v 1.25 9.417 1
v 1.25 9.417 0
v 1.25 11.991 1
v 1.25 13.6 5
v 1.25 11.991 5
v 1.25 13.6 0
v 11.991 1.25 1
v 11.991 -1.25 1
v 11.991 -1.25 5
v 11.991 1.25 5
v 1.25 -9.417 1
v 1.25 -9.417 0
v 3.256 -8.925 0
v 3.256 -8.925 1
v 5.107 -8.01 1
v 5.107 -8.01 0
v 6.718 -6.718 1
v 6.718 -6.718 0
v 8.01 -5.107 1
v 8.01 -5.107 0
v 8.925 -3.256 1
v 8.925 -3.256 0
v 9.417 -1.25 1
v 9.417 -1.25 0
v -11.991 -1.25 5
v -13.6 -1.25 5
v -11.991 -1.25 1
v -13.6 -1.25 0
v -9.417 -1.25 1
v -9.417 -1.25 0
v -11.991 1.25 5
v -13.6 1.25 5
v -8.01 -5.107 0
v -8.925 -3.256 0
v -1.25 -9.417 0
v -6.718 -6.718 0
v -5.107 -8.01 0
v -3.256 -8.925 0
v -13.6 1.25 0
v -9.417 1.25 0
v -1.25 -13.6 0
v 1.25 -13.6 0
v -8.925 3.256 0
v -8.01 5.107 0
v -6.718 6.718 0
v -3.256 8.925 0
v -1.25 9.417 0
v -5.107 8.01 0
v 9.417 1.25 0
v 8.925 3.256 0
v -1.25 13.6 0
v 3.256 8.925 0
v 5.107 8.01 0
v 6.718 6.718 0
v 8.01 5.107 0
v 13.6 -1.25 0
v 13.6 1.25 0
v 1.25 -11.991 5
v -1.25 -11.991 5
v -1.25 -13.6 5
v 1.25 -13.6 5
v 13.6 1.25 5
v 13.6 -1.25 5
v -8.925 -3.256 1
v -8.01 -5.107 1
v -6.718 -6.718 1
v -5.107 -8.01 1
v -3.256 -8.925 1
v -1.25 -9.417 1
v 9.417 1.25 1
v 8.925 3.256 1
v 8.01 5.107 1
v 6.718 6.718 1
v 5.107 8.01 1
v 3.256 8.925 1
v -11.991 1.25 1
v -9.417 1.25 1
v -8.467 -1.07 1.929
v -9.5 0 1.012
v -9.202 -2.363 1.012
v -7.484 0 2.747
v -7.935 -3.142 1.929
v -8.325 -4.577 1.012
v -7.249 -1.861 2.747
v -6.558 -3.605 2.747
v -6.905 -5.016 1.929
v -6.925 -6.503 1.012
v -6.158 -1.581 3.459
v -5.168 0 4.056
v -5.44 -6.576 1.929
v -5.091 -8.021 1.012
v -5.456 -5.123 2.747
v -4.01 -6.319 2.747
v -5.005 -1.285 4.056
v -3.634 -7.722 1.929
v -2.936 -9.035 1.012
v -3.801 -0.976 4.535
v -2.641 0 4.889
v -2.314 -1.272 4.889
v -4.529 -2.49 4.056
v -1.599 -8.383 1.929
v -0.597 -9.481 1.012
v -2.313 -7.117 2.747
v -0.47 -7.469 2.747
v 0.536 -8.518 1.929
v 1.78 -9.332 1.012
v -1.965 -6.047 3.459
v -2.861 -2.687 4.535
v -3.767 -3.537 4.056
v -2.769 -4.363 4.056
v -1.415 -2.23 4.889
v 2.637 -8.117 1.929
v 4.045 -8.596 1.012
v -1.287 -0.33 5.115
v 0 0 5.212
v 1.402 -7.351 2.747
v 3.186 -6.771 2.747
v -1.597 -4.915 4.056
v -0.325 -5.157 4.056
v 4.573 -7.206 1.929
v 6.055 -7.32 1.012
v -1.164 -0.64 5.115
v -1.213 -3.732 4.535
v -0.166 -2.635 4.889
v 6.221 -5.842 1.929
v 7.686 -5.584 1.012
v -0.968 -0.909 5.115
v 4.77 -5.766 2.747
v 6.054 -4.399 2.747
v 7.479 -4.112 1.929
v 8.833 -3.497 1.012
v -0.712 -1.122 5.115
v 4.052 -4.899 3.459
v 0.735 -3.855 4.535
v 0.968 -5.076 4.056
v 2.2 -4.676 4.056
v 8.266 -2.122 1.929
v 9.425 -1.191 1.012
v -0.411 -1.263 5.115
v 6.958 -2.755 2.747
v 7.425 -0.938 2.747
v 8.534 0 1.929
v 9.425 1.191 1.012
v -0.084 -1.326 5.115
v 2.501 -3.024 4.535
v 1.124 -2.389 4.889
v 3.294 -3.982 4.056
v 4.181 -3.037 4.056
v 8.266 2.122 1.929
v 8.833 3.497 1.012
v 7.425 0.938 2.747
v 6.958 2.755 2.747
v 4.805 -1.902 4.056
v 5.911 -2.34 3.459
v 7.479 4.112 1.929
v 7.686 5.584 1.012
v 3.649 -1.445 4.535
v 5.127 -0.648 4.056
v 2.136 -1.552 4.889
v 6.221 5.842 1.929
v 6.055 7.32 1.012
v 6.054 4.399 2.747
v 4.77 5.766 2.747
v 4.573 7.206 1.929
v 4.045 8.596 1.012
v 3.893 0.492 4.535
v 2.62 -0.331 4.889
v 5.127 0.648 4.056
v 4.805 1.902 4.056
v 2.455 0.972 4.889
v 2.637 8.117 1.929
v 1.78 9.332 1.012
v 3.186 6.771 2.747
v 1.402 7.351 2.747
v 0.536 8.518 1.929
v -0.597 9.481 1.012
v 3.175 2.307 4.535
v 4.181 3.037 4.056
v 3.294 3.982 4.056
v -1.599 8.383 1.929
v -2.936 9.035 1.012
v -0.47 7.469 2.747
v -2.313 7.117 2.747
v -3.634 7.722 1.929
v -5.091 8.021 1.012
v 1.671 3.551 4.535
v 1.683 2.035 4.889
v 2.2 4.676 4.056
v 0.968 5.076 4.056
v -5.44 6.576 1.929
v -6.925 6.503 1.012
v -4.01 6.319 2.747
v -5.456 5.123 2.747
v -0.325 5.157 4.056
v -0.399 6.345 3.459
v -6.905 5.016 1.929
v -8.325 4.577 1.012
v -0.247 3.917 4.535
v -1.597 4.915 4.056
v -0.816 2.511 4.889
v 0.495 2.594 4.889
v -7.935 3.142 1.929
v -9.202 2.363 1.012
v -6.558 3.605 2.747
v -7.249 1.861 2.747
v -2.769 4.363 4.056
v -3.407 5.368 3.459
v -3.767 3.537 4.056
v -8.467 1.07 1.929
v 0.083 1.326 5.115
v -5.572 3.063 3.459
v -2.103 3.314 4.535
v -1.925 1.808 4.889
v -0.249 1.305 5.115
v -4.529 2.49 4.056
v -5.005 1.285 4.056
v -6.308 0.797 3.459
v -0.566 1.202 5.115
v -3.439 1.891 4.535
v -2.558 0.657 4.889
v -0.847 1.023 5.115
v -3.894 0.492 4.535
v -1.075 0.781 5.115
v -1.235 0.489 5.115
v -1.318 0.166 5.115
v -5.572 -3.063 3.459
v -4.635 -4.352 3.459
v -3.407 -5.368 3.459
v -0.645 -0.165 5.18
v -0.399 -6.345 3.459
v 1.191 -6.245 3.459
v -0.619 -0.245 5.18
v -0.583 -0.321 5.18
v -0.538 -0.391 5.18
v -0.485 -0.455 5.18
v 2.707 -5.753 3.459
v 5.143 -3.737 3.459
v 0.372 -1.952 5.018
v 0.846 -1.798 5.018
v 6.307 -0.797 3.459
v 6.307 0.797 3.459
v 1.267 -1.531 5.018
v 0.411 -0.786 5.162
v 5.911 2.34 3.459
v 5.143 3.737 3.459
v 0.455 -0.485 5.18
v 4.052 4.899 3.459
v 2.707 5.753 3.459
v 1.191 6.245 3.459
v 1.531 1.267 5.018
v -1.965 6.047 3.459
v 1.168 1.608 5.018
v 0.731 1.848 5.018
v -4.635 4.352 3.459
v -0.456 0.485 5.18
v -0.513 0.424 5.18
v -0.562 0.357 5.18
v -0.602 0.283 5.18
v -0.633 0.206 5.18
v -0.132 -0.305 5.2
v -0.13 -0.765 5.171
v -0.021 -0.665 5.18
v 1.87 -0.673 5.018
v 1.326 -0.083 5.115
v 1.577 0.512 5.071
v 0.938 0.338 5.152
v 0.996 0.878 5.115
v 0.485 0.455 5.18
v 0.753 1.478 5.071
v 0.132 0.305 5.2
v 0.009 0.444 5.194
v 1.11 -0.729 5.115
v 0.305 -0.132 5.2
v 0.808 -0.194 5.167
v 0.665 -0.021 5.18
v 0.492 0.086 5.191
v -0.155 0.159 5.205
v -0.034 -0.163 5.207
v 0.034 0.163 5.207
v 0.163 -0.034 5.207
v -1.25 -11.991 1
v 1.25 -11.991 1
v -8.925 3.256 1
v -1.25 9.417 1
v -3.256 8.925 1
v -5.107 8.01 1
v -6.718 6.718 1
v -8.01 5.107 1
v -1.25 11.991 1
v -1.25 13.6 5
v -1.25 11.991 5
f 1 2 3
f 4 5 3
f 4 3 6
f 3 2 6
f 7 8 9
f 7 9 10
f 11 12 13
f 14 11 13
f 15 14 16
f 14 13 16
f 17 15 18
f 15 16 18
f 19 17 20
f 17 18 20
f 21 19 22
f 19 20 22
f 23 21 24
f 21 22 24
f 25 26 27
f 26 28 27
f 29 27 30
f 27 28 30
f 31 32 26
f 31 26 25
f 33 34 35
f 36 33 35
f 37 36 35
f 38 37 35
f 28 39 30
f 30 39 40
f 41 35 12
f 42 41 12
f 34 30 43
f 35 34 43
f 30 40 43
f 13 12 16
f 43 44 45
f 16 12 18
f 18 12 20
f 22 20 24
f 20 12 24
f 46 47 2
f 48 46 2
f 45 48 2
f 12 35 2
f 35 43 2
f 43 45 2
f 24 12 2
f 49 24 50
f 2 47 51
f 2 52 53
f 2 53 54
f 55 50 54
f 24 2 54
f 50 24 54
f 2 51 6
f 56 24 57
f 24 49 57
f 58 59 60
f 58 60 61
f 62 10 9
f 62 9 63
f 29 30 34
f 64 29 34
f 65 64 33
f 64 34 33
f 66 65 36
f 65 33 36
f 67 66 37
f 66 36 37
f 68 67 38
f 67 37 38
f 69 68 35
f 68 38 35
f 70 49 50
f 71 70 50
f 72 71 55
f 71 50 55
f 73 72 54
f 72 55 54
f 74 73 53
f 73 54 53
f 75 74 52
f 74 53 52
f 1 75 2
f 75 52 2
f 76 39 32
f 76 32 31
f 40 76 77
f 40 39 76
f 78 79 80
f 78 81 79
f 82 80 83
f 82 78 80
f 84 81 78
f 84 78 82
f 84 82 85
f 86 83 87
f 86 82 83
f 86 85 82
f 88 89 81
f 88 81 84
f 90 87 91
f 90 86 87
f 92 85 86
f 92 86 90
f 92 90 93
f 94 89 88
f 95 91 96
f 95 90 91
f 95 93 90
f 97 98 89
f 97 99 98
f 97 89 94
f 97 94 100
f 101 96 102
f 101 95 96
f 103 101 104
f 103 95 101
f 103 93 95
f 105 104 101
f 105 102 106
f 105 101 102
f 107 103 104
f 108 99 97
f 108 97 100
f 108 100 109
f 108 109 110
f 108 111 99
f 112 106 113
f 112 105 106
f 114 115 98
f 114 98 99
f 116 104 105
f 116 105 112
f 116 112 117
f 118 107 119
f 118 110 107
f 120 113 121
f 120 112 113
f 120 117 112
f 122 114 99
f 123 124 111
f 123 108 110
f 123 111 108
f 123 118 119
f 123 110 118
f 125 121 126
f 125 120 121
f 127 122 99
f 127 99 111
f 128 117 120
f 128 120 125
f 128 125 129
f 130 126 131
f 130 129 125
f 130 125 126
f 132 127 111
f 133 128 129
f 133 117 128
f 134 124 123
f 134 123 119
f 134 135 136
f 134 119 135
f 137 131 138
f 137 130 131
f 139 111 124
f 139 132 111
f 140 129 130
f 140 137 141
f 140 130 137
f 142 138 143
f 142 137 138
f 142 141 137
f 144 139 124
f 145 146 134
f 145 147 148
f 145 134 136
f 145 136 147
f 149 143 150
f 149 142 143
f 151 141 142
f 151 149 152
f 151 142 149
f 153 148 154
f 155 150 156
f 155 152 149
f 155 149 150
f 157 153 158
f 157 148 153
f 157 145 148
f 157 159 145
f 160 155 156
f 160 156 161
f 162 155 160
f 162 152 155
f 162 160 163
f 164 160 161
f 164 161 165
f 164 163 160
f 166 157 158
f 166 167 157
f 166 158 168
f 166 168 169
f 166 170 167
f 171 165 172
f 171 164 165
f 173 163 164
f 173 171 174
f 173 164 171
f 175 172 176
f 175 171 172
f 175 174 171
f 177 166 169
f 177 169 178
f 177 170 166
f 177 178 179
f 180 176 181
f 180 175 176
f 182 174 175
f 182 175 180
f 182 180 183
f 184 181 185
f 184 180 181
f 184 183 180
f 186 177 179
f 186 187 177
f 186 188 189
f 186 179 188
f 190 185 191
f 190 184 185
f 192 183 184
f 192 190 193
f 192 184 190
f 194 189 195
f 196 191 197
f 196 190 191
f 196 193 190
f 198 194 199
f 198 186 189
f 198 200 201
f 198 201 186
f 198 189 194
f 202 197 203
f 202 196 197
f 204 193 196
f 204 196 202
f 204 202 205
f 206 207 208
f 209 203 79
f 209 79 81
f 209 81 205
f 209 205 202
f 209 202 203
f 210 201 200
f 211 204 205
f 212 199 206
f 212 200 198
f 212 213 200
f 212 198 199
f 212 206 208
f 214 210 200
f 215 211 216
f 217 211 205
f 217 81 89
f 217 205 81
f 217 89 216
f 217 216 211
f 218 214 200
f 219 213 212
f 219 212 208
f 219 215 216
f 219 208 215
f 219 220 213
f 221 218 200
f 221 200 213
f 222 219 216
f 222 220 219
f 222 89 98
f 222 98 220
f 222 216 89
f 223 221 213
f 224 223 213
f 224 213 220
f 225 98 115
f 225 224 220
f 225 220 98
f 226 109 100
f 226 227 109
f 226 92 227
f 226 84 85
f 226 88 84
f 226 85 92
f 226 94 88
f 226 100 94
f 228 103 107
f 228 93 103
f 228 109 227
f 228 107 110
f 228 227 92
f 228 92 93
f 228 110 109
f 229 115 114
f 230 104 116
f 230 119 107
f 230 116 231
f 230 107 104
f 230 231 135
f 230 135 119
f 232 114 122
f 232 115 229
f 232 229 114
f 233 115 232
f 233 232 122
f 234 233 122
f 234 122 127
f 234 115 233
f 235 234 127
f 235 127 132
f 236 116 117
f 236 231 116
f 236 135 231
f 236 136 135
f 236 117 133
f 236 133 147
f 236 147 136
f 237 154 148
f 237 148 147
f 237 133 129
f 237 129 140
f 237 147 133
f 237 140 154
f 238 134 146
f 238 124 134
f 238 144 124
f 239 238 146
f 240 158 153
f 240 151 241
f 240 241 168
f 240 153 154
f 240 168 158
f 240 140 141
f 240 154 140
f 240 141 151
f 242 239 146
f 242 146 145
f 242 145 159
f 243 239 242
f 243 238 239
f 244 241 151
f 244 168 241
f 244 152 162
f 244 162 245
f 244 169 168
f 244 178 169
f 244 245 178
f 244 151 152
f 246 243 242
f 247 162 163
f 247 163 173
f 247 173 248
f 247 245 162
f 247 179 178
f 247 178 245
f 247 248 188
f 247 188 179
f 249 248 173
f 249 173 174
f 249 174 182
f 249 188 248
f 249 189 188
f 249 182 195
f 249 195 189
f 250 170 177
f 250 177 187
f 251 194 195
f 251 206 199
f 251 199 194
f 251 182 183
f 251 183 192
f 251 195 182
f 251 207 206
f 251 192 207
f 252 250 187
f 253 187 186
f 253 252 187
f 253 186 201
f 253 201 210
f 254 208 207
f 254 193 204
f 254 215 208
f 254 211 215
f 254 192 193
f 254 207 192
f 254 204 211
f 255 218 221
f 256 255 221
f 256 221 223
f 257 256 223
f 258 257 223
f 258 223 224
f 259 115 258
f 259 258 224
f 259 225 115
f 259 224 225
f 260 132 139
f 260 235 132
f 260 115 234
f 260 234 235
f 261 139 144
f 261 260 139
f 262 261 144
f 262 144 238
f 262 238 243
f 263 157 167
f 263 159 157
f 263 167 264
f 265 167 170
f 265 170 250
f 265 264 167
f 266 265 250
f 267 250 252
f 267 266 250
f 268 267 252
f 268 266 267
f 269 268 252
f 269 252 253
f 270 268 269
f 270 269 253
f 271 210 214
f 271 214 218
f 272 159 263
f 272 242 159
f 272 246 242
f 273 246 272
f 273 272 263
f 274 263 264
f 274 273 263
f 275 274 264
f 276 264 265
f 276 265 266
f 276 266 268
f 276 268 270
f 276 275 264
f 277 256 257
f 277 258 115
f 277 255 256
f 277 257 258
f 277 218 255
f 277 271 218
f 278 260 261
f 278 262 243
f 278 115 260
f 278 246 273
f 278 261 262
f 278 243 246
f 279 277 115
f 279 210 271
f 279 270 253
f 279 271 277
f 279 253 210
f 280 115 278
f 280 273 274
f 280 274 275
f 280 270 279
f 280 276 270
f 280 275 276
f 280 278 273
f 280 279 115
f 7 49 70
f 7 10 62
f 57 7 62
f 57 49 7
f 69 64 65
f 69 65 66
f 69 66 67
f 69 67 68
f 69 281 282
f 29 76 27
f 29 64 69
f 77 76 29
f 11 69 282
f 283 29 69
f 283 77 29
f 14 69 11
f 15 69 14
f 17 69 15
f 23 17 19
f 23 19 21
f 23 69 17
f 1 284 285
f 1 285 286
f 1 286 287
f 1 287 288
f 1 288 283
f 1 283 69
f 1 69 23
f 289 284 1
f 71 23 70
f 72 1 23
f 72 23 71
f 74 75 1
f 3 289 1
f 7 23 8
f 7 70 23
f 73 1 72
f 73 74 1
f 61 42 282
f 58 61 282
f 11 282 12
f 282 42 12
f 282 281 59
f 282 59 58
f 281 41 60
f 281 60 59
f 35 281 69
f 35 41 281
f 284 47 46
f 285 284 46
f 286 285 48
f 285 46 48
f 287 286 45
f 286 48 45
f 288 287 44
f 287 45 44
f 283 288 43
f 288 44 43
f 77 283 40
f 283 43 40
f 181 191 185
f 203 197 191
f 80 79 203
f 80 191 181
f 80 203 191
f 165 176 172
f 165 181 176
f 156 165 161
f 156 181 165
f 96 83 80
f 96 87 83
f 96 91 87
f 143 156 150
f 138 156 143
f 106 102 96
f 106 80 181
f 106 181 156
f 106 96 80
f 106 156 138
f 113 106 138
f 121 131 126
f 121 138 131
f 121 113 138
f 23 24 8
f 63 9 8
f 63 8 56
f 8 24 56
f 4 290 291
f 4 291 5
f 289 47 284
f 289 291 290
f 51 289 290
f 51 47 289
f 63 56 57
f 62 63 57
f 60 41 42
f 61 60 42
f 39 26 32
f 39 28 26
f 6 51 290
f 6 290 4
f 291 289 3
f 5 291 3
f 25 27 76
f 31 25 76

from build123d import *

# Parameters (mm, degrees)
SKETCH1_R           = 9.5
SKETCH1_W           = 27.2
SKETCH1_H           = 2.5
SKETCH1_W_2         = 2.5
SKETCH1_H_2         = 27.2
BOSS_EXTRUDE1_DEPTH = 1
SKETCH2_W           = 1.609397648
SKETCH2_H           = 2.5
SKETCH2_W_2         = 2.5
SKETCH2_H_2         = 1.609397648
BOSS_EXTRUDE2_DEPTH = 4


with BuildPart() as part:
    # Sketch1 → Boss-Extrude1 (new body)
    with BuildSketch(Plane.XY):
        Circle(SKETCH1_R)
        Rectangle(SKETCH1_W, SKETCH1_H)
        Rectangle(SKETCH1_W_2, SKETCH1_H_2)
    extrude(amount=BOSS_EXTRUDE1_DEPTH)

    # Sketch2 → Boss-Extrude2 (add)
    with BuildSketch(Plane.XY.offset(1)):
        with Locations((-12.795301176, 0)):
            Rectangle(SKETCH2_W, SKETCH2_H)
        with Locations((0, 12.795301176)):
            Rectangle(SKETCH2_W_2, SKETCH2_H_2)
        with Locations((12.795301176, 0)):
            Rectangle(SKETCH2_W, SKETCH2_H)
        with Locations((0, -12.795301176)):
            Rectangle(SKETCH2_W_2, SKETCH2_H_2)
    extrude(amount=BOSS_EXTRUDE2_DEPTH)


with BuildPart() as body_2:
    # Sketch7 → Revolve4 (revolve)
    with BuildSketch(Plane(origin=(0, 0, 0), x_dir=(1, 0, 0), z_dir=(0, 1, 0))):
        with BuildLine():
            Line((-0.000156816, -1.011901345), (-9.500156816, -1.011901345))
            ThreePointArc((-9.500156816, -1.011901345), (-5.167752239, -4.056462422), (-0.000156816, -5.211901345))
            Line((-0.000156816, -5.211901345), (-0.000156816, -1.011901345))
        make_face()
    revolve(axis=Axis((-0.000156816, 0, 5.211901345), (0, 0, 1)))


solid = Compound([part.part, body_2.part])
